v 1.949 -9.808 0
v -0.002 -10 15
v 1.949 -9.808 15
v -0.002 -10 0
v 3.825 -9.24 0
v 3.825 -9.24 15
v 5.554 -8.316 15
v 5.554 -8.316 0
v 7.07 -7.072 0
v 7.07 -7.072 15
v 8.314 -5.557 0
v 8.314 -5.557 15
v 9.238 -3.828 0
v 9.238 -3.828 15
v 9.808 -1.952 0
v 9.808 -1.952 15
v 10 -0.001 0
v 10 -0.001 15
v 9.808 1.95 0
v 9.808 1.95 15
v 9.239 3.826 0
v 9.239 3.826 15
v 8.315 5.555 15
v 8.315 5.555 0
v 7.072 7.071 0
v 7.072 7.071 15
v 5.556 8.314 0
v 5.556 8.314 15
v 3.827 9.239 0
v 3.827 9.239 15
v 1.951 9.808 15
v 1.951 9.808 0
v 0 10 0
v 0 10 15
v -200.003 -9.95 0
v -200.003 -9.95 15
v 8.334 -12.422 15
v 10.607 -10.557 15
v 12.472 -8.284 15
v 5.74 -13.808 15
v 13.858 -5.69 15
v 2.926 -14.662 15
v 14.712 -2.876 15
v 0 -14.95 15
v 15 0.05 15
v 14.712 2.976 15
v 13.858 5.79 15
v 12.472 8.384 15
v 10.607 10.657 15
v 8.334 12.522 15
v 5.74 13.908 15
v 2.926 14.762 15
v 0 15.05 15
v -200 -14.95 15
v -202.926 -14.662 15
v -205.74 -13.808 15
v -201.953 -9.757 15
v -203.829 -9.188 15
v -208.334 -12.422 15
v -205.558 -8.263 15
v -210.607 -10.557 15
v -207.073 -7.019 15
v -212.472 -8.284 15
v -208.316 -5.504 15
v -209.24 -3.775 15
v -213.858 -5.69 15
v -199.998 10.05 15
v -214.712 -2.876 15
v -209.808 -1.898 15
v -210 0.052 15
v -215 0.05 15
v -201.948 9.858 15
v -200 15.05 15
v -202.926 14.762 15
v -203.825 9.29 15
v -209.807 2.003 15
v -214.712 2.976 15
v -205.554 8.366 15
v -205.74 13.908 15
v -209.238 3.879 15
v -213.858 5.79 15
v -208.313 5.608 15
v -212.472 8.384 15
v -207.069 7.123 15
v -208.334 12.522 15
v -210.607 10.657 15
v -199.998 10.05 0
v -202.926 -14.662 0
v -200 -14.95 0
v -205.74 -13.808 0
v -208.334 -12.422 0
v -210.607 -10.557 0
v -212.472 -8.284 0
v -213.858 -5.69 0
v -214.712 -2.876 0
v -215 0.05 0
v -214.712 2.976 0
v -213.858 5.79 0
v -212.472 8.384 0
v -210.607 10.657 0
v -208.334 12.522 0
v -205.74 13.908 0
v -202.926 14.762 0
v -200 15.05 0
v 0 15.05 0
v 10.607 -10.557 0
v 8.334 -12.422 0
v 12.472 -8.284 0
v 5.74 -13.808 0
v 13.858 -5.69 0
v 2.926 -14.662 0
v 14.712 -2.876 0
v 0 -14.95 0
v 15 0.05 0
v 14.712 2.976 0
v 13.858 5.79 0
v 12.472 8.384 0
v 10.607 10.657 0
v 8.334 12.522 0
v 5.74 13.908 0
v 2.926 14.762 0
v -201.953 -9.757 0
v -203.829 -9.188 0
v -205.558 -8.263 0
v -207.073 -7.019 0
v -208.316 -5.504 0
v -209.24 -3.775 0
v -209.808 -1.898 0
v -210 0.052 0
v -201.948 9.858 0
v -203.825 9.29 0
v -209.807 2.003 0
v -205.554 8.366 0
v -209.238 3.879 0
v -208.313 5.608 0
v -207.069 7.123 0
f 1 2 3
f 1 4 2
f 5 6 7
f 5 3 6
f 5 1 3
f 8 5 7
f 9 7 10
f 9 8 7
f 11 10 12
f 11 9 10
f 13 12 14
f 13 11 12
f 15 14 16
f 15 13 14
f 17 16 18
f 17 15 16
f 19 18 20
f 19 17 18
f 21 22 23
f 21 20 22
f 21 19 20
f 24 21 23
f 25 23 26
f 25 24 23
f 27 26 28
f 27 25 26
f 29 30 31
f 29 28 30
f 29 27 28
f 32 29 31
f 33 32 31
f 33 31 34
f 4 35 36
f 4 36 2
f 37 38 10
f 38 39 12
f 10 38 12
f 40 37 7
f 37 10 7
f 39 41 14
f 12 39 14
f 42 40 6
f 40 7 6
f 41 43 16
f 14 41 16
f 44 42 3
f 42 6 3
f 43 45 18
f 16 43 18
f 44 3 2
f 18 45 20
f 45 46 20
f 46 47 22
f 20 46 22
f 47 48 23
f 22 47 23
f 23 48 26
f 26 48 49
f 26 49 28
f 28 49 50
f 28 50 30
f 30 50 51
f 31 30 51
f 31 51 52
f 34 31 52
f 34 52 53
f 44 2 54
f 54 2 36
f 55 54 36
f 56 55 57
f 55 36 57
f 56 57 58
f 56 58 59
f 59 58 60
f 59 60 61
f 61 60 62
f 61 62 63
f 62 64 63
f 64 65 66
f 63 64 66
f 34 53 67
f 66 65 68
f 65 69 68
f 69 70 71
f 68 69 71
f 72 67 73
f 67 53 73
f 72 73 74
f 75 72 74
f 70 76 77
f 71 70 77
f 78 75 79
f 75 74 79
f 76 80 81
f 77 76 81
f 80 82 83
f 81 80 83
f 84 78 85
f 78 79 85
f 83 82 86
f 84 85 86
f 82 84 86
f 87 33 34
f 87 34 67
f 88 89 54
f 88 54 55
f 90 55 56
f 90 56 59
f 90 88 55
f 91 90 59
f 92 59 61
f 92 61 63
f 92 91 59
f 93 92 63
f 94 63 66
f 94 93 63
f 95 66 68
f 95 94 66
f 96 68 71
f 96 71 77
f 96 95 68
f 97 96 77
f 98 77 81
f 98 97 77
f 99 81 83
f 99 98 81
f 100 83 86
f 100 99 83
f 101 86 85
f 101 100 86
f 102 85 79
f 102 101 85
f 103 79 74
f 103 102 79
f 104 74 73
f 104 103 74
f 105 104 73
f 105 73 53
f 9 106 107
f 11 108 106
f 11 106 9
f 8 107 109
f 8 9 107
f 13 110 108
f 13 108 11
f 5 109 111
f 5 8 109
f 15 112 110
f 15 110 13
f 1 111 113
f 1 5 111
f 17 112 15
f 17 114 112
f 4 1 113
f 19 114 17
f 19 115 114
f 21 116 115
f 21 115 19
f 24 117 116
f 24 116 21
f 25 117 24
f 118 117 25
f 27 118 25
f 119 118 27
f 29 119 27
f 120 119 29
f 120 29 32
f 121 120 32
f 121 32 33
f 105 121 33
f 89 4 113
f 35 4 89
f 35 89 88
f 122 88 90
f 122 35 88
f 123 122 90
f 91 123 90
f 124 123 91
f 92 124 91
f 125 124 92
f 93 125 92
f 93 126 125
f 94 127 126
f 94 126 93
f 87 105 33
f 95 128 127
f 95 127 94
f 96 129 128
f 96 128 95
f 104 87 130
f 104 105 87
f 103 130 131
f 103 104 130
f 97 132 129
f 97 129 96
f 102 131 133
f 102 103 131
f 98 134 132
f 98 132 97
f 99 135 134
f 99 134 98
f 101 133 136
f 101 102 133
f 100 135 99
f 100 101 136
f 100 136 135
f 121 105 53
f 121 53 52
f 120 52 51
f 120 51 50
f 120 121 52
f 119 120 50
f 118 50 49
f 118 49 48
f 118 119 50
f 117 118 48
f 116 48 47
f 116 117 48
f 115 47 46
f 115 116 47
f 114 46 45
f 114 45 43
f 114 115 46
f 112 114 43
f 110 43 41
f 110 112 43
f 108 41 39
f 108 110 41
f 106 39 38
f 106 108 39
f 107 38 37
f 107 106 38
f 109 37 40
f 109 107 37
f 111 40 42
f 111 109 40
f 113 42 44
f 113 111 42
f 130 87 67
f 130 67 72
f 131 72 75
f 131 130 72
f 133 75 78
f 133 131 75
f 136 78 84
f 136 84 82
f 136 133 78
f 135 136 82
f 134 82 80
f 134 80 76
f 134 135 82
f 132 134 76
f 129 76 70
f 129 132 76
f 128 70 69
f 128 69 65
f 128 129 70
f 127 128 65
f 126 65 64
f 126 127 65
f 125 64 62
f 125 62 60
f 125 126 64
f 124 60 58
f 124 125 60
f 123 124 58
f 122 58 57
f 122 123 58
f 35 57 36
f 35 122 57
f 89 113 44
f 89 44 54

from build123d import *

# Parameters (mm, degrees)
SKETCH1_R          = 10
EXTRUDE1_DEPTH     = 15
CUT_EXTRUDE1_START = -15
CUT_EXTRUDE1_DEPTH = 15


# Read off the part's stored shape, not the designer's step: Cut-Extrude1
with BuildPart() as part:
    # Sketch1 → Extrude1 (new body)
    with BuildSketch(Plane.XY):
        with BuildLine():
            Line((-200, 15.05), (0, 15.05))
            ThreePointArc((0, 15.05), (15, 0.05), (0, -14.95))
            Line((0, -14.95), (-200, -14.95))
            ThreePointArc((-200, -14.95), (-215, 0.05), (-200, 15.05))
        make_face()
        with Locations((-200, 0.05)):
            Circle(SKETCH1_R, mode=Mode.SUBTRACT)
        Circle(SKETCH1_R, mode=Mode.SUBTRACT)
    extrude(amount=EXTRUDE1_DEPTH)

    # Cut-Extrude1 outline → Cut-Extrude1 (cut)
    with BuildSketch(Plane.XY.offset(15).offset(CUT_EXTRUDE1_START)):
        with BuildLine():
            ThreePointArc((-199.997500016, 10.049999688), (-190.000000313, 0.0475), (-200.002500016, -9.949999687))
            Line((-200.002500016, -9.949999687), (-0.002499984, -9.999999688))
            ThreePointArc((-0.002499984, -9.999999688), (-9.999999922, 0.001249992), (0, 10))
            Line((0, 10), (-199.997500016, 10.049999688))
        make_face()
    extrude(amount=CUT_EXTRUDE1_DEPTH, mode=Mode.SUBTRACT)


solid = part.part
